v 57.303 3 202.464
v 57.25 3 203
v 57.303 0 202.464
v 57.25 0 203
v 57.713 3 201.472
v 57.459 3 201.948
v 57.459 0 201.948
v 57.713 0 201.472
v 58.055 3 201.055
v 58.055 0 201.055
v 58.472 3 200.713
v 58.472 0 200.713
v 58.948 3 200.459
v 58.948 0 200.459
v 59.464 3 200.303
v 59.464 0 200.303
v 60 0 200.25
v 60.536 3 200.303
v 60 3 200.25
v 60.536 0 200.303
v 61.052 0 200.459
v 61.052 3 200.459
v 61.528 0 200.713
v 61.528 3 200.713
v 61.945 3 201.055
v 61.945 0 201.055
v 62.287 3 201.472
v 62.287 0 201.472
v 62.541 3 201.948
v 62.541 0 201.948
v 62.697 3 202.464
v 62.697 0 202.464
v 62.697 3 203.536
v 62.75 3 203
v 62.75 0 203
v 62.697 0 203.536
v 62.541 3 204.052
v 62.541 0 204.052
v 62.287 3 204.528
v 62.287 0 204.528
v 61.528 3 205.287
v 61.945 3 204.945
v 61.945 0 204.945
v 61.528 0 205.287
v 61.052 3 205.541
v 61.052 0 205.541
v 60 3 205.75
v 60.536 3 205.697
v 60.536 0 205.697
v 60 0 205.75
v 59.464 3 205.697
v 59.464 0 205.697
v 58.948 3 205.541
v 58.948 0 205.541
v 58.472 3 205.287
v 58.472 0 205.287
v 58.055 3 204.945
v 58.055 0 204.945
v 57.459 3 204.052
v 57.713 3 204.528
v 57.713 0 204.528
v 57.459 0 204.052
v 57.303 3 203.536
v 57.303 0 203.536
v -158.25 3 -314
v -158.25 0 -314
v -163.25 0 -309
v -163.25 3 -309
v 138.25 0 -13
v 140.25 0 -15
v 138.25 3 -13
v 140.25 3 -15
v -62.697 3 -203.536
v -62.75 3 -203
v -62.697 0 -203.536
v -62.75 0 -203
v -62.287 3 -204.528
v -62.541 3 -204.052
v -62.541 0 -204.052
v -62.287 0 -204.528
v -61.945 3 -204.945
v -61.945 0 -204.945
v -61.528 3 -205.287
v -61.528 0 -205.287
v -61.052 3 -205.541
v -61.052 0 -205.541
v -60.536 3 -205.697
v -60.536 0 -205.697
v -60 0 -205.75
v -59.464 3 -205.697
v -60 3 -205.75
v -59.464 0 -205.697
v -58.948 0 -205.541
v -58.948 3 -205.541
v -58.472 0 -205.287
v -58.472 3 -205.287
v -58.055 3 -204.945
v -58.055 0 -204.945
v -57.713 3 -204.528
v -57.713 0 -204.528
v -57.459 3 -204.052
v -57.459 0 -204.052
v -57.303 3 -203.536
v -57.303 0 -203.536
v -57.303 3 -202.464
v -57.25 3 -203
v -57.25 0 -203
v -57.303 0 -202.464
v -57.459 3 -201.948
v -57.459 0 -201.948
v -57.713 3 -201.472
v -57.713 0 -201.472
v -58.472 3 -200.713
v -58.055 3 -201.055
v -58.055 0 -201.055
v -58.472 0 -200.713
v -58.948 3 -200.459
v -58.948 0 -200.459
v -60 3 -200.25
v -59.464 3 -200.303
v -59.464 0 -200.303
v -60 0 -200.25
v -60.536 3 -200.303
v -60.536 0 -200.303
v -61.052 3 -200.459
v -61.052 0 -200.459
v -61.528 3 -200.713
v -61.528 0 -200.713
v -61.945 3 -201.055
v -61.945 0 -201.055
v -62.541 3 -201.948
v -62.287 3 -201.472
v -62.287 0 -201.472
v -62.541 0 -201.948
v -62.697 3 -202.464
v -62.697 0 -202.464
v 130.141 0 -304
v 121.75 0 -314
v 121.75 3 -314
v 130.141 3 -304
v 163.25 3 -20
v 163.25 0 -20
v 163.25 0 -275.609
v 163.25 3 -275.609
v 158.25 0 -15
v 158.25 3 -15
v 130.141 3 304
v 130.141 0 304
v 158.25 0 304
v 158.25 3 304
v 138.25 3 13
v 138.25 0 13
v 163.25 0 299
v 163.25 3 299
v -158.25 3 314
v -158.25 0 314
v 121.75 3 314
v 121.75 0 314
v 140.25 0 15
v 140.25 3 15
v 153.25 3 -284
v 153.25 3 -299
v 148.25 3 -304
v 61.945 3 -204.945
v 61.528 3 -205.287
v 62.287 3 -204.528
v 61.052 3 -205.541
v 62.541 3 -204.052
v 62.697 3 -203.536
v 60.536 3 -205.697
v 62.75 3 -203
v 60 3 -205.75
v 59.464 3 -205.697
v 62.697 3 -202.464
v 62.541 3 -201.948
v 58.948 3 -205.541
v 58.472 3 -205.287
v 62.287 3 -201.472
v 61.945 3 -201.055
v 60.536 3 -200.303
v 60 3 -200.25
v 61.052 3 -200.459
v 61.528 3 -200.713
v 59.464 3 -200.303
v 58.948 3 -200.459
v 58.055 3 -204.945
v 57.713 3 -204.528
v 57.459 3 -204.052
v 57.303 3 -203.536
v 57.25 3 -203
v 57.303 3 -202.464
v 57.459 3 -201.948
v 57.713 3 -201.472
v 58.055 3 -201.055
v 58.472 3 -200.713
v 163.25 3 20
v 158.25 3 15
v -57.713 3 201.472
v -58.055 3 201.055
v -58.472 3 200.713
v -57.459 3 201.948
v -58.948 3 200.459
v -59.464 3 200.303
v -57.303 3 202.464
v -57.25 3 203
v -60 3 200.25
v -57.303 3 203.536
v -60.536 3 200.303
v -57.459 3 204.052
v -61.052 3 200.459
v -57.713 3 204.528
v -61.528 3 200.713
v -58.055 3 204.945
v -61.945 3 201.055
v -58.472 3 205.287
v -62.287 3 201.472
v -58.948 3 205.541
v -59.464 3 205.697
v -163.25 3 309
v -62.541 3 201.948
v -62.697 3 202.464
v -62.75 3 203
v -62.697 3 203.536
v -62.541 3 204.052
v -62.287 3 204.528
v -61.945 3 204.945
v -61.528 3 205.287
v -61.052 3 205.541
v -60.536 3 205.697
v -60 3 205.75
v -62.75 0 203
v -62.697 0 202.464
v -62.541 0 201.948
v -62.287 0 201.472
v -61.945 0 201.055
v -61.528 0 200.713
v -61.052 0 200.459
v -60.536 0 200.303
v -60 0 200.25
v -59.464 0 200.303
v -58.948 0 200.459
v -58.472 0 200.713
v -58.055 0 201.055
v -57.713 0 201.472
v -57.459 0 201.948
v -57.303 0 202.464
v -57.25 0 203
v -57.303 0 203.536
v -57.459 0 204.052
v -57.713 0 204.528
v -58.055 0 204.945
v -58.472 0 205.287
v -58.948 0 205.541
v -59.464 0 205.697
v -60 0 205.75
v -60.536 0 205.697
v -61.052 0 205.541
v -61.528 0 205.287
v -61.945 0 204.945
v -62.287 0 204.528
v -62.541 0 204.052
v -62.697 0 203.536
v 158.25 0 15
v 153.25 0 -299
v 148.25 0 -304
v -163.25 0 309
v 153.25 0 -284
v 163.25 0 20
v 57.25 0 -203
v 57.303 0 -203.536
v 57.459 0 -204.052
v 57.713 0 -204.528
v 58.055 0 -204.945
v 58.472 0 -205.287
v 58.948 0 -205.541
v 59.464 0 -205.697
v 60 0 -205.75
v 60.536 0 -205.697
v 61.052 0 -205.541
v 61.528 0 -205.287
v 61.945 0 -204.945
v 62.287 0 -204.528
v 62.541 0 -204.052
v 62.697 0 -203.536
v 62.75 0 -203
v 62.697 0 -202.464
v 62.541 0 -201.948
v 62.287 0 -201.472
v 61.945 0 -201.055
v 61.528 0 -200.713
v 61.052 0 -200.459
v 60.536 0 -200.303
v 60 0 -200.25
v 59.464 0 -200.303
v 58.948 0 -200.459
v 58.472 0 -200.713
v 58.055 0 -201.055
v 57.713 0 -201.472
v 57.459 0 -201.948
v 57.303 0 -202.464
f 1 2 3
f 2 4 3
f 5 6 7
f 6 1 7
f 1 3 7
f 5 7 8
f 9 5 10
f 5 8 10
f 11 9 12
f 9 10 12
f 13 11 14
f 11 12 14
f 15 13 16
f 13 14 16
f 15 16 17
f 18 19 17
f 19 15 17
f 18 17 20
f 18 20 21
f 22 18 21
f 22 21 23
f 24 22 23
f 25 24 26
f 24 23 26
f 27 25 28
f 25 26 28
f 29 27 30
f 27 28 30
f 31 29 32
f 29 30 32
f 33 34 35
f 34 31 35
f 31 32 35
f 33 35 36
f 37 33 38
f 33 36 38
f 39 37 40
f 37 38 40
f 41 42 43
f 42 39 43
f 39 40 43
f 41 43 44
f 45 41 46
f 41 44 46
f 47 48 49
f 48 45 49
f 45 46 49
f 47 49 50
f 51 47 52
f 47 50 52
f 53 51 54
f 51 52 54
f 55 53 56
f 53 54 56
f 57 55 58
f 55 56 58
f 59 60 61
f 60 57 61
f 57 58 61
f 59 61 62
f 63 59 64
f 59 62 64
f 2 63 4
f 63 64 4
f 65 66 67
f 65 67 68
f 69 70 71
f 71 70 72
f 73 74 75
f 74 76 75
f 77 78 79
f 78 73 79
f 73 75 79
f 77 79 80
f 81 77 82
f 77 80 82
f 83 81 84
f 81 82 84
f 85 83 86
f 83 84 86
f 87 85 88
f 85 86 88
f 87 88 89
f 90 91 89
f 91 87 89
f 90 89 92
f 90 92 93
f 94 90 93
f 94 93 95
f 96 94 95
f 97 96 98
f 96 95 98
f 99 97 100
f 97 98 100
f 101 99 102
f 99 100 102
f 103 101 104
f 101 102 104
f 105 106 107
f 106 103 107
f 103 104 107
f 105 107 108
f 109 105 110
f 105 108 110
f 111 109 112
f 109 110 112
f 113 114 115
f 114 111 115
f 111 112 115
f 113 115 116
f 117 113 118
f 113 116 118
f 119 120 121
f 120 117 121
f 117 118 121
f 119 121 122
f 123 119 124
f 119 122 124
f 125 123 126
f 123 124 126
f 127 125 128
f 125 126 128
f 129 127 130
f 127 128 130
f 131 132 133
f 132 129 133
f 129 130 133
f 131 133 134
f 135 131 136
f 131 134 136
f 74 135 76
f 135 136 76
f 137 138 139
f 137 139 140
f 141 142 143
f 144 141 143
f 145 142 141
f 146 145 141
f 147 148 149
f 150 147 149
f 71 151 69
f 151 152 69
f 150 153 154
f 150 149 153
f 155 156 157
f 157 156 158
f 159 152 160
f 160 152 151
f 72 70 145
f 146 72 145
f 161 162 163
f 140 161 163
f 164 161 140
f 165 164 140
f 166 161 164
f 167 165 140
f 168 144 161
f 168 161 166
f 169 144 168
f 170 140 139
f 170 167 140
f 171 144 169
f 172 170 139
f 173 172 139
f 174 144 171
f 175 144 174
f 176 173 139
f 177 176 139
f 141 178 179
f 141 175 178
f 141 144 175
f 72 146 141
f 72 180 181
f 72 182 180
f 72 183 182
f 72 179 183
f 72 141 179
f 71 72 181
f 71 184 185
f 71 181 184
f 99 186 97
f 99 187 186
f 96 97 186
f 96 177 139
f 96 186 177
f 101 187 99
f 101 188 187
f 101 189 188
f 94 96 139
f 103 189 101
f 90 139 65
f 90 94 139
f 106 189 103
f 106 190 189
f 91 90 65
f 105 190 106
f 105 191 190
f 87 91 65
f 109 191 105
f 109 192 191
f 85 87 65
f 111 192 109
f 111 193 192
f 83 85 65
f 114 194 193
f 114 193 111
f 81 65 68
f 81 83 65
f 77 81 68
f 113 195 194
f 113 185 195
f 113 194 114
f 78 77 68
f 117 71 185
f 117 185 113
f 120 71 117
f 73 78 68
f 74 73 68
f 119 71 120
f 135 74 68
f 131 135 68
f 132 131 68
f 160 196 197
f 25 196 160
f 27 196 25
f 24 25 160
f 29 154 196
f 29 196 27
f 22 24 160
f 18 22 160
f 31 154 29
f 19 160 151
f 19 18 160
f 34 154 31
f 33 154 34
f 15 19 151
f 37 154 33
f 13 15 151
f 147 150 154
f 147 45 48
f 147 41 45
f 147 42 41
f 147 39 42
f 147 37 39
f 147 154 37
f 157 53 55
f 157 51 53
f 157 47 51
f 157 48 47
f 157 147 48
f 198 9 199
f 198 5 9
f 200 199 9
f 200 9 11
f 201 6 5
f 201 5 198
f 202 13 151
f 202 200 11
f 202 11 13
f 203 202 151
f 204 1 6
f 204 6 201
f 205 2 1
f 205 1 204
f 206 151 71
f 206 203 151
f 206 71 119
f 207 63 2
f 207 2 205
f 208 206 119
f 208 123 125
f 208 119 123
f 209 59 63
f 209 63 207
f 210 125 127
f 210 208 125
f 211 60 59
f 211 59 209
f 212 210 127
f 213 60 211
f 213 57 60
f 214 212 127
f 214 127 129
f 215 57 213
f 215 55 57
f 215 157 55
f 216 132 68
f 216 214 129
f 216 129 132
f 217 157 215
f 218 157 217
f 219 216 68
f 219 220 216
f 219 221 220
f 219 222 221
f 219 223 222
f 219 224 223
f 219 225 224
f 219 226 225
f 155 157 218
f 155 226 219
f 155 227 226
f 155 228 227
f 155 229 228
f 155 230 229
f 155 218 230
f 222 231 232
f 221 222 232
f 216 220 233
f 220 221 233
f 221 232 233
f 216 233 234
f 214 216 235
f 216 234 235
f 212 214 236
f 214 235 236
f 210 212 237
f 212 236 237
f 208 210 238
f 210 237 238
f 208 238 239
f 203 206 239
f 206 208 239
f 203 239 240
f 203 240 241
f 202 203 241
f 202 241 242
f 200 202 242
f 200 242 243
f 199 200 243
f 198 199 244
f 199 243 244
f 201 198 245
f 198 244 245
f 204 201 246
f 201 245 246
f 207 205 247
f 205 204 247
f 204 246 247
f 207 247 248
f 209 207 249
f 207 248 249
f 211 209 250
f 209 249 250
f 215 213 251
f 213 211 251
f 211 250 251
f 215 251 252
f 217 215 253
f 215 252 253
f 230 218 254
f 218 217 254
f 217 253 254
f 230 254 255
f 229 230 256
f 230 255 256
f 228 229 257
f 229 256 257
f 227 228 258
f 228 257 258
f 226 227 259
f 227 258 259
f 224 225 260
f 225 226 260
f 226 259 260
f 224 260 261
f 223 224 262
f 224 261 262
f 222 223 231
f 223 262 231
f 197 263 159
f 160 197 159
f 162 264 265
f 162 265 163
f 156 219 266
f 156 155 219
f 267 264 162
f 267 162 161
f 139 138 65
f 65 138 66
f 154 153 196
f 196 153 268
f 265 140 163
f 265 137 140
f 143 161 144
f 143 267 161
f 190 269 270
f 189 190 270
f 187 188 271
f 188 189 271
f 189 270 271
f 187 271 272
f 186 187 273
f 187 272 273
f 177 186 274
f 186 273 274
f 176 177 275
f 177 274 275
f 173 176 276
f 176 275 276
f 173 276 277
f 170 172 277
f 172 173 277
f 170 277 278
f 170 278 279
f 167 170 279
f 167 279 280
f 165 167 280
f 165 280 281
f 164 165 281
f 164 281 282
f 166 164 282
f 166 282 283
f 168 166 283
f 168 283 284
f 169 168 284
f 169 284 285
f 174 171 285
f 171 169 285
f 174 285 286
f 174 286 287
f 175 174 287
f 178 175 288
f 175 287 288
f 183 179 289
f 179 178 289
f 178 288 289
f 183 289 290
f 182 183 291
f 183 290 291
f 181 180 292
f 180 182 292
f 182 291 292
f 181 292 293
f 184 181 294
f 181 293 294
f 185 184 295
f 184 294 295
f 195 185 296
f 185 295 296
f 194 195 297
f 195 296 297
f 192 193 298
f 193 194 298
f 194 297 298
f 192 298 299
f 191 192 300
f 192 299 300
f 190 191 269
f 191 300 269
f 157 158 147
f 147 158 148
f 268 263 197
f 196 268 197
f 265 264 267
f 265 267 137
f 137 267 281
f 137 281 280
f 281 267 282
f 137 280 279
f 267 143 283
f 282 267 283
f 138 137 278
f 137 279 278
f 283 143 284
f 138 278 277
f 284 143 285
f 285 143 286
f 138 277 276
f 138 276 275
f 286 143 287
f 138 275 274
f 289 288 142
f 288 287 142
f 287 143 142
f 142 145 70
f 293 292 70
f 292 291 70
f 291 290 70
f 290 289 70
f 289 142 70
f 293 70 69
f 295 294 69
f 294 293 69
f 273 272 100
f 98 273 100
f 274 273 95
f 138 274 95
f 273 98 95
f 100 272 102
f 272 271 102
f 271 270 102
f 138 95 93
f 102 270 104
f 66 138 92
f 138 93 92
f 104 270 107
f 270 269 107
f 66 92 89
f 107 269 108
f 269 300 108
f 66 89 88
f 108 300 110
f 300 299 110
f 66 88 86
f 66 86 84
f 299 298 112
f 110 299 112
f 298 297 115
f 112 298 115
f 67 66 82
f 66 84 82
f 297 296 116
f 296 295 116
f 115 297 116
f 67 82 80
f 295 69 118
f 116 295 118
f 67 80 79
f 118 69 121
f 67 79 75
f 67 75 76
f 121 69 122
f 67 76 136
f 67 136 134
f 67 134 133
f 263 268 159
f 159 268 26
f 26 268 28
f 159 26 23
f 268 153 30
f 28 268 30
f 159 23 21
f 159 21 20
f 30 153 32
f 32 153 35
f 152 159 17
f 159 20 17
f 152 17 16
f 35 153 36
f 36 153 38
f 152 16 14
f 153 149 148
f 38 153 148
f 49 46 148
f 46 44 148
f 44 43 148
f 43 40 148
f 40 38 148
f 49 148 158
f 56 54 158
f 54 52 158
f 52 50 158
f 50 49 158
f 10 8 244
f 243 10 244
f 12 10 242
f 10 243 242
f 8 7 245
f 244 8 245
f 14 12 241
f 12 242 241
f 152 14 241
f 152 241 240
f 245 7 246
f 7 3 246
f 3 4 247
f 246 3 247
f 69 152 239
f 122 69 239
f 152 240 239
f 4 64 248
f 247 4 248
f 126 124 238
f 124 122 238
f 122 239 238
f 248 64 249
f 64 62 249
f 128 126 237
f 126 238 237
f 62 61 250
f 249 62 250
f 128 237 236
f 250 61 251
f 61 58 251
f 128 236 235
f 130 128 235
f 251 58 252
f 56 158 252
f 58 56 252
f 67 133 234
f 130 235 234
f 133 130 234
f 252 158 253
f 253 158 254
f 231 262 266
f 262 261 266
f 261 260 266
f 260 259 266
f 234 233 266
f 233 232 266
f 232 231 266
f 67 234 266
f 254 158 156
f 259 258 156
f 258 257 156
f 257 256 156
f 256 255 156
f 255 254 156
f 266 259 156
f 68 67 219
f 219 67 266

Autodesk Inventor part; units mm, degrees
ref_plane "YZ Plane" through (0, 0, 0) normal (1, 0, 0) x (0, 1, 0)
ref_plane "XZ Plane" through (0, 0, 0) normal (0, 1, 0) x (-1, 0, 0)
ref_plane "XY Plane" through (0, 0, 0) normal (0, 0, 1) x (1, 0, 0)
sketch "Skizze1" plane through (0, 0, 0) normal (0, 1, 0) x (-1, 0, 0)
  line L0 (163.25, 314) -> (-163.25, 314)
  line L1 (-163.25, 314) -> (-163.25, -314)
  line L2 (-163.25, -314) -> (163.25, -314)
  line L3 (163.25, -314) -> (163.25, 314)
  line L4 (163.25, 314) -> (-163.25, -314) construction
  line L5 (-163.25, 314) -> (163.25, -314) construction
  line L6 (-228.55, 0) -> (228.55, 0) construction
  line L7 (0, -439.6) -> (0, 439.6) construction
  circle A0 centre (60, -203) radius 2.75
  circle A1 centre (-60, -203) radius 2.75
  circle A2 centre (60, 203) radius 2.75
  circle A3 centre (-60, 203) radius 2.75
  line L8 (-121.75, -314) -> (-130.141, -304)
  line L9 (-130.141, -304) -> (-163.25, -304)
  line L10 (-121.75, 314) -> (-130.141, 304)
  line L11 (-130.141, 304) -> (-163.25, 304)
  line L12 (-163.25, -314) -> (-153.25, -314)
  line L13 (-153.25, -314) -> (-153.25, -284)
  line L14 (-153.25, -284) -> (-163.25, -284)
  line L15 (-163.25, -284) -> (-163.25, -314)
  line L16 (-153.25, -284) -> (-163.25, -275.609)
  line L17 (-163.25, 15) -> (-138.25, 15)
  line L18 (-138.25, 15) -> (-138.25, -15)
  line L19 (-138.25, -15) -> (-163.25, -15)
  line L20 (-163.25, -15) -> (-163.25, 15)
  point P0 (0, 0)
  point P1 (-163.25, 304)
  point P2 (-153.25, -304)
  point P3 (-138.25, 0)
  dimension "d0" = 628
  dimension "d1" = 326.5
  dimension "d2" = 5.5
  dimension "d3" = 60
  dimension "d4" = 111
  dimension "d10" = 41.5
  dimension "d11" = 10
  dimension "d12" = 50
  dimension "d13" = 10
  dimension "d14" = 30
  dimension "d15" = 50
  dimension "d16" = 25
  dimension "d17" = 30
extrude "Extrusion1" add sketch "Skizze1" along normal blind 3 contours L3 L2 L8 L9 L13 L16 L1 L19 L18 L17 L11 L10 L0
chamfer "Fase-5mm" distance 5 angle 45 6 edges at (-163.25, 1.5, 314) (-163.25, 1.5, -314) (153.25, 1.5, -304) (163.25, 1.5, -15) (163.25, 1.5, 15) (163.25, 1.5, 304)
chamfer "Fase-2mm" distance 2 angle 45 2 edges at (138.25, 1.5, -15) (138.25, 1.5, 15)
properties part number "enc-BackPanel Top V2"
